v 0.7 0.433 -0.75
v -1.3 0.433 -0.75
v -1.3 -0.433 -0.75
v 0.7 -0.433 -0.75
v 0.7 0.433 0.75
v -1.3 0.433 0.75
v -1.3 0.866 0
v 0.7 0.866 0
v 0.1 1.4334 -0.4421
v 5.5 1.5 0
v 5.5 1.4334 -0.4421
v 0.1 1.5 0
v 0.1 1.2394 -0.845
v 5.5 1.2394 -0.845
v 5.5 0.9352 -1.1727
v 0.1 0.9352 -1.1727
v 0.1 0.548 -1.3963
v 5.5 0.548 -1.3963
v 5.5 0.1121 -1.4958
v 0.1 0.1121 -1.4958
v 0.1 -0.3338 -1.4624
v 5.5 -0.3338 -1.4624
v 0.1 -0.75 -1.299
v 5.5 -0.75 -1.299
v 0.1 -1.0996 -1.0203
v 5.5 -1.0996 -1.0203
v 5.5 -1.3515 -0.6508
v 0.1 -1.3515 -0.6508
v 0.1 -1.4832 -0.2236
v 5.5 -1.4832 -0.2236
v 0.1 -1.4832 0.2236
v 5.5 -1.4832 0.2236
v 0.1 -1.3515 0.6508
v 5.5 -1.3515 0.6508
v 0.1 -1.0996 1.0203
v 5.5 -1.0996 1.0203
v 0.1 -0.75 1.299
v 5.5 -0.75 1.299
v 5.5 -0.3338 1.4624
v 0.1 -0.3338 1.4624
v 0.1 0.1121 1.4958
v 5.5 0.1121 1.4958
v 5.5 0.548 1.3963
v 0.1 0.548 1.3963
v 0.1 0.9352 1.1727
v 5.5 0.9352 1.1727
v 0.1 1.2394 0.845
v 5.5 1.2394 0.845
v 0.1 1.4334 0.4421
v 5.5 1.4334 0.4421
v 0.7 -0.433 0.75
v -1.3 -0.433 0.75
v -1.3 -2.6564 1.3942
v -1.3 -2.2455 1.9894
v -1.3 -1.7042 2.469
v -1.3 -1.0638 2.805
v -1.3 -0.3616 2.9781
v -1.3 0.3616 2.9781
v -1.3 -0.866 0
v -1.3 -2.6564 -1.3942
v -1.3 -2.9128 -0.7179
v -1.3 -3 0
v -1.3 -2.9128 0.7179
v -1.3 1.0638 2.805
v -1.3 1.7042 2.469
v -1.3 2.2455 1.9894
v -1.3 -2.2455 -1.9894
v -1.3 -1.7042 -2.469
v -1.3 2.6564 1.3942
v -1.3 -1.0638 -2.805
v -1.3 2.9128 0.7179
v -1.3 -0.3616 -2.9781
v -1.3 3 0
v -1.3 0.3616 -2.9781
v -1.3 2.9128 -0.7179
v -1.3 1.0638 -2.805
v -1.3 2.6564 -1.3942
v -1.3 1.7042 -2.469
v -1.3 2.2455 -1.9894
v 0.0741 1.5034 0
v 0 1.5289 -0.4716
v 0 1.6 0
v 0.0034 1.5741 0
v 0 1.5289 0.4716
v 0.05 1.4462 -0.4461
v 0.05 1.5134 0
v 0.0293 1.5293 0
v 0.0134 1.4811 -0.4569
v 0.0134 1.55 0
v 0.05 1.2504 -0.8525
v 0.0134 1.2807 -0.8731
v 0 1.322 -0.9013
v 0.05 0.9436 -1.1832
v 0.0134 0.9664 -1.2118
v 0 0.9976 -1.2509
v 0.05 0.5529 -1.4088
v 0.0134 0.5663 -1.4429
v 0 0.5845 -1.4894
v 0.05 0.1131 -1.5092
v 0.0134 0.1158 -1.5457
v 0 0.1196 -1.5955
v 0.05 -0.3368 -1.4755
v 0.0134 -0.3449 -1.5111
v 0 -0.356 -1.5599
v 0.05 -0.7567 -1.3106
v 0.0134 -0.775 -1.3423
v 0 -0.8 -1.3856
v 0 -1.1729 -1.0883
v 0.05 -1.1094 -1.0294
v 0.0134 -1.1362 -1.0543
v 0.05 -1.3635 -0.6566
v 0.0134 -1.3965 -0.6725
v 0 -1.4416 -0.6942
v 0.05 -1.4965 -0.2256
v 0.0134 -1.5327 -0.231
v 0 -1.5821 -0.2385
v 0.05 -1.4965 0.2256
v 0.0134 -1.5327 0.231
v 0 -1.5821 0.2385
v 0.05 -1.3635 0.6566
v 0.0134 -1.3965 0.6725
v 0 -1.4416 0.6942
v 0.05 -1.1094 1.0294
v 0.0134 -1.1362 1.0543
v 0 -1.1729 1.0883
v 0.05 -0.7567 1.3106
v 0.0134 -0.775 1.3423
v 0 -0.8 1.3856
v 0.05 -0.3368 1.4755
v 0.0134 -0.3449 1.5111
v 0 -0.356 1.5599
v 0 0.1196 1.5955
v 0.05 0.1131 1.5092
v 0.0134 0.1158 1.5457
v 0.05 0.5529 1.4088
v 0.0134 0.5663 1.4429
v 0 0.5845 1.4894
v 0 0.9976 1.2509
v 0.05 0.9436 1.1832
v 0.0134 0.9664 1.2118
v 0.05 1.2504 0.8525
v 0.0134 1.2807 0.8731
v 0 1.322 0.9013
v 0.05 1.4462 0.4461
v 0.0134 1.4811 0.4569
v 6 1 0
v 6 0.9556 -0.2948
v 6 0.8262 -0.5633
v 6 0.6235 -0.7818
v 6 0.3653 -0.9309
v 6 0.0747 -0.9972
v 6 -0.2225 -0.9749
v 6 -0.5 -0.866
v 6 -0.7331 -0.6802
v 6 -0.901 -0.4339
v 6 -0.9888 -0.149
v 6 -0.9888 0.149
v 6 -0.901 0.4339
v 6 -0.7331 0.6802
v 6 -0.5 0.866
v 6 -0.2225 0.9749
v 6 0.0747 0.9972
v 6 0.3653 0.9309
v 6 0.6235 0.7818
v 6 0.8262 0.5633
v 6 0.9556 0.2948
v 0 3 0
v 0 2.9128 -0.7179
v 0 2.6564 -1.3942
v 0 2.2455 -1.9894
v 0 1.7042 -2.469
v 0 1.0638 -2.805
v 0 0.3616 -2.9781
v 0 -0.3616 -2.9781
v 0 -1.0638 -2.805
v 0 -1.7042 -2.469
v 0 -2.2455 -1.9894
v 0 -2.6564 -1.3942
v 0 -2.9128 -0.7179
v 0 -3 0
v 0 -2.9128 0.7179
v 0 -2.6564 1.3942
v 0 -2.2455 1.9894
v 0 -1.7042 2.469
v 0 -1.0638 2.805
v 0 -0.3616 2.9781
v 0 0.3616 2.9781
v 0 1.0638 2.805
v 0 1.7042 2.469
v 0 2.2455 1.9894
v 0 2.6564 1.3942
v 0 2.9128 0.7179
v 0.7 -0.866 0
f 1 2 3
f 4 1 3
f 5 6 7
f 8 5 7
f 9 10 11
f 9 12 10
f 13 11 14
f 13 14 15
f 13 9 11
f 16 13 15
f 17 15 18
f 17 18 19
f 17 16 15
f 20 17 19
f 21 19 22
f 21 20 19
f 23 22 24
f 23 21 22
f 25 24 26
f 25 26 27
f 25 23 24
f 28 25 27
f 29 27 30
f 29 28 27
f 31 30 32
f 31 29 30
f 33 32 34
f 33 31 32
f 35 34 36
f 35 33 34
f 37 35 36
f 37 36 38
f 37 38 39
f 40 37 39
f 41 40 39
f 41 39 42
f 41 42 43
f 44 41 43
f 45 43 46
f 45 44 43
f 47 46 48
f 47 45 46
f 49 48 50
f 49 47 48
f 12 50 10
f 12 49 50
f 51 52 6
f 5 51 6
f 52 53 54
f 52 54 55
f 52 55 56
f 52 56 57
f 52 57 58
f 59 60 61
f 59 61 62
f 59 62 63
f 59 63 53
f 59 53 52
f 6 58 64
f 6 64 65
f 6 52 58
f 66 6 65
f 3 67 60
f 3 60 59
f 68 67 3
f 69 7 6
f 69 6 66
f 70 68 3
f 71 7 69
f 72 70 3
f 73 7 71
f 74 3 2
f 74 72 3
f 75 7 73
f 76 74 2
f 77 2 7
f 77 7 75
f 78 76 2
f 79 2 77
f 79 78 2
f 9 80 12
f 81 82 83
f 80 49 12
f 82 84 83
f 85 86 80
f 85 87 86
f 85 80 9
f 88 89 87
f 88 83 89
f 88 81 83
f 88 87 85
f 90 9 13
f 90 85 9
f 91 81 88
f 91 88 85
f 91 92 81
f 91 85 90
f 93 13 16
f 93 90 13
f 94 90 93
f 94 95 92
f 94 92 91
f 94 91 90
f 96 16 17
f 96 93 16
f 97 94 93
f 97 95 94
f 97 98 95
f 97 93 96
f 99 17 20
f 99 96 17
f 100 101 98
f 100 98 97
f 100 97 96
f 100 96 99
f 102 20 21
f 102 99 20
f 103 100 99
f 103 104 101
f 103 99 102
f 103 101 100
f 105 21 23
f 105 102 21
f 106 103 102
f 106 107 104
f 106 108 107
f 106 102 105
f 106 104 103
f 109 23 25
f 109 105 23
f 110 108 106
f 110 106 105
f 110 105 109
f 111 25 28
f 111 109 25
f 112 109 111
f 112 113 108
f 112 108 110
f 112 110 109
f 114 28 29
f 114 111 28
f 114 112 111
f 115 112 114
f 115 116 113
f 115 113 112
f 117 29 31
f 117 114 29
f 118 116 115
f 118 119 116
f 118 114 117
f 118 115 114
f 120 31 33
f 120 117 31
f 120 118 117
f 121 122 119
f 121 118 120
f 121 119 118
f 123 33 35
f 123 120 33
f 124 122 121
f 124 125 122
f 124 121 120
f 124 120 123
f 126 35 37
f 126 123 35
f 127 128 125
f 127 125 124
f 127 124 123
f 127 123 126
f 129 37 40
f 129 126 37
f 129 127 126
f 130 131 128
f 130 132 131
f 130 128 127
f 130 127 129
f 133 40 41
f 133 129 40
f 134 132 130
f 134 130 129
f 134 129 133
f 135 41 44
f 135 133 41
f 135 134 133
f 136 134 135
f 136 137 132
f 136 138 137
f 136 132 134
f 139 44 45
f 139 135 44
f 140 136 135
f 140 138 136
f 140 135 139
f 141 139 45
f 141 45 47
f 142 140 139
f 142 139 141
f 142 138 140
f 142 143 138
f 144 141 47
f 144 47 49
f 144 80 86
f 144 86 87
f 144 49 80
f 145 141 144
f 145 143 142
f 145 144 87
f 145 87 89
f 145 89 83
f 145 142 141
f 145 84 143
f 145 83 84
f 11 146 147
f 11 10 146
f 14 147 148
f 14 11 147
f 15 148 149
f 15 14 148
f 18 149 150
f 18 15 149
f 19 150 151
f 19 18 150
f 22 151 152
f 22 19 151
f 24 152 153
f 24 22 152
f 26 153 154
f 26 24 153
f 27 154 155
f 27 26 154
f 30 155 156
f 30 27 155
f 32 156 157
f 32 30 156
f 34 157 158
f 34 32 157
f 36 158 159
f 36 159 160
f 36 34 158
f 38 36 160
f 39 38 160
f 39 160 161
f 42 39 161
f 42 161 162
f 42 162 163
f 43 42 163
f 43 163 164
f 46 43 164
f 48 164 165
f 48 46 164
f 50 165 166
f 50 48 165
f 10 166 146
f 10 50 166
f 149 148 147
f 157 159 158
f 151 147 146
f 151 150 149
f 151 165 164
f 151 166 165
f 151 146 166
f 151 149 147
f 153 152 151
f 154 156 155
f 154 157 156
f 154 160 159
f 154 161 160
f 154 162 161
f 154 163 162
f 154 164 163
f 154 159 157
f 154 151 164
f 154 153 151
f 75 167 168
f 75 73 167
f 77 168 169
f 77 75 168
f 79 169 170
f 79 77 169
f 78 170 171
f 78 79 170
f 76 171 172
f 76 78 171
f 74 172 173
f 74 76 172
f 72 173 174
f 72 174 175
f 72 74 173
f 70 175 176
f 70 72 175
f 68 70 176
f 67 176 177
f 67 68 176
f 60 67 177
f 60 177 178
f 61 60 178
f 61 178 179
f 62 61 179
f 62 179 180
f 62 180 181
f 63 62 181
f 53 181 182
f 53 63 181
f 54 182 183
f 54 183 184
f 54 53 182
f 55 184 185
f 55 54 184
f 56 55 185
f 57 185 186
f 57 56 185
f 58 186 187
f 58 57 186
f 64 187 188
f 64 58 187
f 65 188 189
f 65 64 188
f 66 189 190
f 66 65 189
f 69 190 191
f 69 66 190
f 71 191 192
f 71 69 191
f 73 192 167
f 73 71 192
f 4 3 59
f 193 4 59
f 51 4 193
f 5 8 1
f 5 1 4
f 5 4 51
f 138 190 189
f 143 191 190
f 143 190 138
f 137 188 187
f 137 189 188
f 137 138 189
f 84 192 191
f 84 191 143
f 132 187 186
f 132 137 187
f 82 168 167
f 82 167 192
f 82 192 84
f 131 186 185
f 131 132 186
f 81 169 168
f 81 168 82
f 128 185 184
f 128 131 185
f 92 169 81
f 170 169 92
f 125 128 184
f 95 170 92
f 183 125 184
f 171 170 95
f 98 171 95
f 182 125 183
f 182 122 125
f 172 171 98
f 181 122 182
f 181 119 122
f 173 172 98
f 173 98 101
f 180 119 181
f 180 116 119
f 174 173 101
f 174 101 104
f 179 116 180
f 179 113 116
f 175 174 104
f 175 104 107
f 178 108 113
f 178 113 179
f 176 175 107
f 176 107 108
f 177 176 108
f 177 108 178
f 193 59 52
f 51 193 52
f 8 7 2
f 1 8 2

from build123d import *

# Parameters (mm, degrees)
CUT_EXTRUDE1_DEPTH = 2


with BuildPart() as part:
    # Sketch1 → Revolve1 (revolve)
    with BuildSketch(Plane.XY):
        with BuildLine():
            Line((-1.3, 0), (6, 0))
            Line((6, 0), (6, -1))
            Line((6, -1), (5.5, -1.5))
            Line((5.5, -1.5), (0.1, -1.5))
            ThreePointArc((0.1, -1.5), (0.029289322, -1.529289322), (0, -1.6))
            Line((0, -1.6), (0, -3))
            Line((0, -3), (-1.3, -3))
            Line((-1.3, -3), (-1.3, 0))
        make_face()
    revolve(axis=Axis((6, 0, 0), (-1, 0, 0)))

    # Sketch2 → Cut-Extrude1 (cut)
    with BuildSketch(Plane.ZY.offset(1.3)):
        Polygon((0, 0.866025404), (-0.75, 0.433012702), (-0.75, -0.433012702), (0, -0.866025404), (0.75, -0.433012702), (0.75, 0.433012702), align=None)
    extrude(amount=-CUT_EXTRUDE1_DEPTH, mode=Mode.SUBTRACT)


solid = part.part
